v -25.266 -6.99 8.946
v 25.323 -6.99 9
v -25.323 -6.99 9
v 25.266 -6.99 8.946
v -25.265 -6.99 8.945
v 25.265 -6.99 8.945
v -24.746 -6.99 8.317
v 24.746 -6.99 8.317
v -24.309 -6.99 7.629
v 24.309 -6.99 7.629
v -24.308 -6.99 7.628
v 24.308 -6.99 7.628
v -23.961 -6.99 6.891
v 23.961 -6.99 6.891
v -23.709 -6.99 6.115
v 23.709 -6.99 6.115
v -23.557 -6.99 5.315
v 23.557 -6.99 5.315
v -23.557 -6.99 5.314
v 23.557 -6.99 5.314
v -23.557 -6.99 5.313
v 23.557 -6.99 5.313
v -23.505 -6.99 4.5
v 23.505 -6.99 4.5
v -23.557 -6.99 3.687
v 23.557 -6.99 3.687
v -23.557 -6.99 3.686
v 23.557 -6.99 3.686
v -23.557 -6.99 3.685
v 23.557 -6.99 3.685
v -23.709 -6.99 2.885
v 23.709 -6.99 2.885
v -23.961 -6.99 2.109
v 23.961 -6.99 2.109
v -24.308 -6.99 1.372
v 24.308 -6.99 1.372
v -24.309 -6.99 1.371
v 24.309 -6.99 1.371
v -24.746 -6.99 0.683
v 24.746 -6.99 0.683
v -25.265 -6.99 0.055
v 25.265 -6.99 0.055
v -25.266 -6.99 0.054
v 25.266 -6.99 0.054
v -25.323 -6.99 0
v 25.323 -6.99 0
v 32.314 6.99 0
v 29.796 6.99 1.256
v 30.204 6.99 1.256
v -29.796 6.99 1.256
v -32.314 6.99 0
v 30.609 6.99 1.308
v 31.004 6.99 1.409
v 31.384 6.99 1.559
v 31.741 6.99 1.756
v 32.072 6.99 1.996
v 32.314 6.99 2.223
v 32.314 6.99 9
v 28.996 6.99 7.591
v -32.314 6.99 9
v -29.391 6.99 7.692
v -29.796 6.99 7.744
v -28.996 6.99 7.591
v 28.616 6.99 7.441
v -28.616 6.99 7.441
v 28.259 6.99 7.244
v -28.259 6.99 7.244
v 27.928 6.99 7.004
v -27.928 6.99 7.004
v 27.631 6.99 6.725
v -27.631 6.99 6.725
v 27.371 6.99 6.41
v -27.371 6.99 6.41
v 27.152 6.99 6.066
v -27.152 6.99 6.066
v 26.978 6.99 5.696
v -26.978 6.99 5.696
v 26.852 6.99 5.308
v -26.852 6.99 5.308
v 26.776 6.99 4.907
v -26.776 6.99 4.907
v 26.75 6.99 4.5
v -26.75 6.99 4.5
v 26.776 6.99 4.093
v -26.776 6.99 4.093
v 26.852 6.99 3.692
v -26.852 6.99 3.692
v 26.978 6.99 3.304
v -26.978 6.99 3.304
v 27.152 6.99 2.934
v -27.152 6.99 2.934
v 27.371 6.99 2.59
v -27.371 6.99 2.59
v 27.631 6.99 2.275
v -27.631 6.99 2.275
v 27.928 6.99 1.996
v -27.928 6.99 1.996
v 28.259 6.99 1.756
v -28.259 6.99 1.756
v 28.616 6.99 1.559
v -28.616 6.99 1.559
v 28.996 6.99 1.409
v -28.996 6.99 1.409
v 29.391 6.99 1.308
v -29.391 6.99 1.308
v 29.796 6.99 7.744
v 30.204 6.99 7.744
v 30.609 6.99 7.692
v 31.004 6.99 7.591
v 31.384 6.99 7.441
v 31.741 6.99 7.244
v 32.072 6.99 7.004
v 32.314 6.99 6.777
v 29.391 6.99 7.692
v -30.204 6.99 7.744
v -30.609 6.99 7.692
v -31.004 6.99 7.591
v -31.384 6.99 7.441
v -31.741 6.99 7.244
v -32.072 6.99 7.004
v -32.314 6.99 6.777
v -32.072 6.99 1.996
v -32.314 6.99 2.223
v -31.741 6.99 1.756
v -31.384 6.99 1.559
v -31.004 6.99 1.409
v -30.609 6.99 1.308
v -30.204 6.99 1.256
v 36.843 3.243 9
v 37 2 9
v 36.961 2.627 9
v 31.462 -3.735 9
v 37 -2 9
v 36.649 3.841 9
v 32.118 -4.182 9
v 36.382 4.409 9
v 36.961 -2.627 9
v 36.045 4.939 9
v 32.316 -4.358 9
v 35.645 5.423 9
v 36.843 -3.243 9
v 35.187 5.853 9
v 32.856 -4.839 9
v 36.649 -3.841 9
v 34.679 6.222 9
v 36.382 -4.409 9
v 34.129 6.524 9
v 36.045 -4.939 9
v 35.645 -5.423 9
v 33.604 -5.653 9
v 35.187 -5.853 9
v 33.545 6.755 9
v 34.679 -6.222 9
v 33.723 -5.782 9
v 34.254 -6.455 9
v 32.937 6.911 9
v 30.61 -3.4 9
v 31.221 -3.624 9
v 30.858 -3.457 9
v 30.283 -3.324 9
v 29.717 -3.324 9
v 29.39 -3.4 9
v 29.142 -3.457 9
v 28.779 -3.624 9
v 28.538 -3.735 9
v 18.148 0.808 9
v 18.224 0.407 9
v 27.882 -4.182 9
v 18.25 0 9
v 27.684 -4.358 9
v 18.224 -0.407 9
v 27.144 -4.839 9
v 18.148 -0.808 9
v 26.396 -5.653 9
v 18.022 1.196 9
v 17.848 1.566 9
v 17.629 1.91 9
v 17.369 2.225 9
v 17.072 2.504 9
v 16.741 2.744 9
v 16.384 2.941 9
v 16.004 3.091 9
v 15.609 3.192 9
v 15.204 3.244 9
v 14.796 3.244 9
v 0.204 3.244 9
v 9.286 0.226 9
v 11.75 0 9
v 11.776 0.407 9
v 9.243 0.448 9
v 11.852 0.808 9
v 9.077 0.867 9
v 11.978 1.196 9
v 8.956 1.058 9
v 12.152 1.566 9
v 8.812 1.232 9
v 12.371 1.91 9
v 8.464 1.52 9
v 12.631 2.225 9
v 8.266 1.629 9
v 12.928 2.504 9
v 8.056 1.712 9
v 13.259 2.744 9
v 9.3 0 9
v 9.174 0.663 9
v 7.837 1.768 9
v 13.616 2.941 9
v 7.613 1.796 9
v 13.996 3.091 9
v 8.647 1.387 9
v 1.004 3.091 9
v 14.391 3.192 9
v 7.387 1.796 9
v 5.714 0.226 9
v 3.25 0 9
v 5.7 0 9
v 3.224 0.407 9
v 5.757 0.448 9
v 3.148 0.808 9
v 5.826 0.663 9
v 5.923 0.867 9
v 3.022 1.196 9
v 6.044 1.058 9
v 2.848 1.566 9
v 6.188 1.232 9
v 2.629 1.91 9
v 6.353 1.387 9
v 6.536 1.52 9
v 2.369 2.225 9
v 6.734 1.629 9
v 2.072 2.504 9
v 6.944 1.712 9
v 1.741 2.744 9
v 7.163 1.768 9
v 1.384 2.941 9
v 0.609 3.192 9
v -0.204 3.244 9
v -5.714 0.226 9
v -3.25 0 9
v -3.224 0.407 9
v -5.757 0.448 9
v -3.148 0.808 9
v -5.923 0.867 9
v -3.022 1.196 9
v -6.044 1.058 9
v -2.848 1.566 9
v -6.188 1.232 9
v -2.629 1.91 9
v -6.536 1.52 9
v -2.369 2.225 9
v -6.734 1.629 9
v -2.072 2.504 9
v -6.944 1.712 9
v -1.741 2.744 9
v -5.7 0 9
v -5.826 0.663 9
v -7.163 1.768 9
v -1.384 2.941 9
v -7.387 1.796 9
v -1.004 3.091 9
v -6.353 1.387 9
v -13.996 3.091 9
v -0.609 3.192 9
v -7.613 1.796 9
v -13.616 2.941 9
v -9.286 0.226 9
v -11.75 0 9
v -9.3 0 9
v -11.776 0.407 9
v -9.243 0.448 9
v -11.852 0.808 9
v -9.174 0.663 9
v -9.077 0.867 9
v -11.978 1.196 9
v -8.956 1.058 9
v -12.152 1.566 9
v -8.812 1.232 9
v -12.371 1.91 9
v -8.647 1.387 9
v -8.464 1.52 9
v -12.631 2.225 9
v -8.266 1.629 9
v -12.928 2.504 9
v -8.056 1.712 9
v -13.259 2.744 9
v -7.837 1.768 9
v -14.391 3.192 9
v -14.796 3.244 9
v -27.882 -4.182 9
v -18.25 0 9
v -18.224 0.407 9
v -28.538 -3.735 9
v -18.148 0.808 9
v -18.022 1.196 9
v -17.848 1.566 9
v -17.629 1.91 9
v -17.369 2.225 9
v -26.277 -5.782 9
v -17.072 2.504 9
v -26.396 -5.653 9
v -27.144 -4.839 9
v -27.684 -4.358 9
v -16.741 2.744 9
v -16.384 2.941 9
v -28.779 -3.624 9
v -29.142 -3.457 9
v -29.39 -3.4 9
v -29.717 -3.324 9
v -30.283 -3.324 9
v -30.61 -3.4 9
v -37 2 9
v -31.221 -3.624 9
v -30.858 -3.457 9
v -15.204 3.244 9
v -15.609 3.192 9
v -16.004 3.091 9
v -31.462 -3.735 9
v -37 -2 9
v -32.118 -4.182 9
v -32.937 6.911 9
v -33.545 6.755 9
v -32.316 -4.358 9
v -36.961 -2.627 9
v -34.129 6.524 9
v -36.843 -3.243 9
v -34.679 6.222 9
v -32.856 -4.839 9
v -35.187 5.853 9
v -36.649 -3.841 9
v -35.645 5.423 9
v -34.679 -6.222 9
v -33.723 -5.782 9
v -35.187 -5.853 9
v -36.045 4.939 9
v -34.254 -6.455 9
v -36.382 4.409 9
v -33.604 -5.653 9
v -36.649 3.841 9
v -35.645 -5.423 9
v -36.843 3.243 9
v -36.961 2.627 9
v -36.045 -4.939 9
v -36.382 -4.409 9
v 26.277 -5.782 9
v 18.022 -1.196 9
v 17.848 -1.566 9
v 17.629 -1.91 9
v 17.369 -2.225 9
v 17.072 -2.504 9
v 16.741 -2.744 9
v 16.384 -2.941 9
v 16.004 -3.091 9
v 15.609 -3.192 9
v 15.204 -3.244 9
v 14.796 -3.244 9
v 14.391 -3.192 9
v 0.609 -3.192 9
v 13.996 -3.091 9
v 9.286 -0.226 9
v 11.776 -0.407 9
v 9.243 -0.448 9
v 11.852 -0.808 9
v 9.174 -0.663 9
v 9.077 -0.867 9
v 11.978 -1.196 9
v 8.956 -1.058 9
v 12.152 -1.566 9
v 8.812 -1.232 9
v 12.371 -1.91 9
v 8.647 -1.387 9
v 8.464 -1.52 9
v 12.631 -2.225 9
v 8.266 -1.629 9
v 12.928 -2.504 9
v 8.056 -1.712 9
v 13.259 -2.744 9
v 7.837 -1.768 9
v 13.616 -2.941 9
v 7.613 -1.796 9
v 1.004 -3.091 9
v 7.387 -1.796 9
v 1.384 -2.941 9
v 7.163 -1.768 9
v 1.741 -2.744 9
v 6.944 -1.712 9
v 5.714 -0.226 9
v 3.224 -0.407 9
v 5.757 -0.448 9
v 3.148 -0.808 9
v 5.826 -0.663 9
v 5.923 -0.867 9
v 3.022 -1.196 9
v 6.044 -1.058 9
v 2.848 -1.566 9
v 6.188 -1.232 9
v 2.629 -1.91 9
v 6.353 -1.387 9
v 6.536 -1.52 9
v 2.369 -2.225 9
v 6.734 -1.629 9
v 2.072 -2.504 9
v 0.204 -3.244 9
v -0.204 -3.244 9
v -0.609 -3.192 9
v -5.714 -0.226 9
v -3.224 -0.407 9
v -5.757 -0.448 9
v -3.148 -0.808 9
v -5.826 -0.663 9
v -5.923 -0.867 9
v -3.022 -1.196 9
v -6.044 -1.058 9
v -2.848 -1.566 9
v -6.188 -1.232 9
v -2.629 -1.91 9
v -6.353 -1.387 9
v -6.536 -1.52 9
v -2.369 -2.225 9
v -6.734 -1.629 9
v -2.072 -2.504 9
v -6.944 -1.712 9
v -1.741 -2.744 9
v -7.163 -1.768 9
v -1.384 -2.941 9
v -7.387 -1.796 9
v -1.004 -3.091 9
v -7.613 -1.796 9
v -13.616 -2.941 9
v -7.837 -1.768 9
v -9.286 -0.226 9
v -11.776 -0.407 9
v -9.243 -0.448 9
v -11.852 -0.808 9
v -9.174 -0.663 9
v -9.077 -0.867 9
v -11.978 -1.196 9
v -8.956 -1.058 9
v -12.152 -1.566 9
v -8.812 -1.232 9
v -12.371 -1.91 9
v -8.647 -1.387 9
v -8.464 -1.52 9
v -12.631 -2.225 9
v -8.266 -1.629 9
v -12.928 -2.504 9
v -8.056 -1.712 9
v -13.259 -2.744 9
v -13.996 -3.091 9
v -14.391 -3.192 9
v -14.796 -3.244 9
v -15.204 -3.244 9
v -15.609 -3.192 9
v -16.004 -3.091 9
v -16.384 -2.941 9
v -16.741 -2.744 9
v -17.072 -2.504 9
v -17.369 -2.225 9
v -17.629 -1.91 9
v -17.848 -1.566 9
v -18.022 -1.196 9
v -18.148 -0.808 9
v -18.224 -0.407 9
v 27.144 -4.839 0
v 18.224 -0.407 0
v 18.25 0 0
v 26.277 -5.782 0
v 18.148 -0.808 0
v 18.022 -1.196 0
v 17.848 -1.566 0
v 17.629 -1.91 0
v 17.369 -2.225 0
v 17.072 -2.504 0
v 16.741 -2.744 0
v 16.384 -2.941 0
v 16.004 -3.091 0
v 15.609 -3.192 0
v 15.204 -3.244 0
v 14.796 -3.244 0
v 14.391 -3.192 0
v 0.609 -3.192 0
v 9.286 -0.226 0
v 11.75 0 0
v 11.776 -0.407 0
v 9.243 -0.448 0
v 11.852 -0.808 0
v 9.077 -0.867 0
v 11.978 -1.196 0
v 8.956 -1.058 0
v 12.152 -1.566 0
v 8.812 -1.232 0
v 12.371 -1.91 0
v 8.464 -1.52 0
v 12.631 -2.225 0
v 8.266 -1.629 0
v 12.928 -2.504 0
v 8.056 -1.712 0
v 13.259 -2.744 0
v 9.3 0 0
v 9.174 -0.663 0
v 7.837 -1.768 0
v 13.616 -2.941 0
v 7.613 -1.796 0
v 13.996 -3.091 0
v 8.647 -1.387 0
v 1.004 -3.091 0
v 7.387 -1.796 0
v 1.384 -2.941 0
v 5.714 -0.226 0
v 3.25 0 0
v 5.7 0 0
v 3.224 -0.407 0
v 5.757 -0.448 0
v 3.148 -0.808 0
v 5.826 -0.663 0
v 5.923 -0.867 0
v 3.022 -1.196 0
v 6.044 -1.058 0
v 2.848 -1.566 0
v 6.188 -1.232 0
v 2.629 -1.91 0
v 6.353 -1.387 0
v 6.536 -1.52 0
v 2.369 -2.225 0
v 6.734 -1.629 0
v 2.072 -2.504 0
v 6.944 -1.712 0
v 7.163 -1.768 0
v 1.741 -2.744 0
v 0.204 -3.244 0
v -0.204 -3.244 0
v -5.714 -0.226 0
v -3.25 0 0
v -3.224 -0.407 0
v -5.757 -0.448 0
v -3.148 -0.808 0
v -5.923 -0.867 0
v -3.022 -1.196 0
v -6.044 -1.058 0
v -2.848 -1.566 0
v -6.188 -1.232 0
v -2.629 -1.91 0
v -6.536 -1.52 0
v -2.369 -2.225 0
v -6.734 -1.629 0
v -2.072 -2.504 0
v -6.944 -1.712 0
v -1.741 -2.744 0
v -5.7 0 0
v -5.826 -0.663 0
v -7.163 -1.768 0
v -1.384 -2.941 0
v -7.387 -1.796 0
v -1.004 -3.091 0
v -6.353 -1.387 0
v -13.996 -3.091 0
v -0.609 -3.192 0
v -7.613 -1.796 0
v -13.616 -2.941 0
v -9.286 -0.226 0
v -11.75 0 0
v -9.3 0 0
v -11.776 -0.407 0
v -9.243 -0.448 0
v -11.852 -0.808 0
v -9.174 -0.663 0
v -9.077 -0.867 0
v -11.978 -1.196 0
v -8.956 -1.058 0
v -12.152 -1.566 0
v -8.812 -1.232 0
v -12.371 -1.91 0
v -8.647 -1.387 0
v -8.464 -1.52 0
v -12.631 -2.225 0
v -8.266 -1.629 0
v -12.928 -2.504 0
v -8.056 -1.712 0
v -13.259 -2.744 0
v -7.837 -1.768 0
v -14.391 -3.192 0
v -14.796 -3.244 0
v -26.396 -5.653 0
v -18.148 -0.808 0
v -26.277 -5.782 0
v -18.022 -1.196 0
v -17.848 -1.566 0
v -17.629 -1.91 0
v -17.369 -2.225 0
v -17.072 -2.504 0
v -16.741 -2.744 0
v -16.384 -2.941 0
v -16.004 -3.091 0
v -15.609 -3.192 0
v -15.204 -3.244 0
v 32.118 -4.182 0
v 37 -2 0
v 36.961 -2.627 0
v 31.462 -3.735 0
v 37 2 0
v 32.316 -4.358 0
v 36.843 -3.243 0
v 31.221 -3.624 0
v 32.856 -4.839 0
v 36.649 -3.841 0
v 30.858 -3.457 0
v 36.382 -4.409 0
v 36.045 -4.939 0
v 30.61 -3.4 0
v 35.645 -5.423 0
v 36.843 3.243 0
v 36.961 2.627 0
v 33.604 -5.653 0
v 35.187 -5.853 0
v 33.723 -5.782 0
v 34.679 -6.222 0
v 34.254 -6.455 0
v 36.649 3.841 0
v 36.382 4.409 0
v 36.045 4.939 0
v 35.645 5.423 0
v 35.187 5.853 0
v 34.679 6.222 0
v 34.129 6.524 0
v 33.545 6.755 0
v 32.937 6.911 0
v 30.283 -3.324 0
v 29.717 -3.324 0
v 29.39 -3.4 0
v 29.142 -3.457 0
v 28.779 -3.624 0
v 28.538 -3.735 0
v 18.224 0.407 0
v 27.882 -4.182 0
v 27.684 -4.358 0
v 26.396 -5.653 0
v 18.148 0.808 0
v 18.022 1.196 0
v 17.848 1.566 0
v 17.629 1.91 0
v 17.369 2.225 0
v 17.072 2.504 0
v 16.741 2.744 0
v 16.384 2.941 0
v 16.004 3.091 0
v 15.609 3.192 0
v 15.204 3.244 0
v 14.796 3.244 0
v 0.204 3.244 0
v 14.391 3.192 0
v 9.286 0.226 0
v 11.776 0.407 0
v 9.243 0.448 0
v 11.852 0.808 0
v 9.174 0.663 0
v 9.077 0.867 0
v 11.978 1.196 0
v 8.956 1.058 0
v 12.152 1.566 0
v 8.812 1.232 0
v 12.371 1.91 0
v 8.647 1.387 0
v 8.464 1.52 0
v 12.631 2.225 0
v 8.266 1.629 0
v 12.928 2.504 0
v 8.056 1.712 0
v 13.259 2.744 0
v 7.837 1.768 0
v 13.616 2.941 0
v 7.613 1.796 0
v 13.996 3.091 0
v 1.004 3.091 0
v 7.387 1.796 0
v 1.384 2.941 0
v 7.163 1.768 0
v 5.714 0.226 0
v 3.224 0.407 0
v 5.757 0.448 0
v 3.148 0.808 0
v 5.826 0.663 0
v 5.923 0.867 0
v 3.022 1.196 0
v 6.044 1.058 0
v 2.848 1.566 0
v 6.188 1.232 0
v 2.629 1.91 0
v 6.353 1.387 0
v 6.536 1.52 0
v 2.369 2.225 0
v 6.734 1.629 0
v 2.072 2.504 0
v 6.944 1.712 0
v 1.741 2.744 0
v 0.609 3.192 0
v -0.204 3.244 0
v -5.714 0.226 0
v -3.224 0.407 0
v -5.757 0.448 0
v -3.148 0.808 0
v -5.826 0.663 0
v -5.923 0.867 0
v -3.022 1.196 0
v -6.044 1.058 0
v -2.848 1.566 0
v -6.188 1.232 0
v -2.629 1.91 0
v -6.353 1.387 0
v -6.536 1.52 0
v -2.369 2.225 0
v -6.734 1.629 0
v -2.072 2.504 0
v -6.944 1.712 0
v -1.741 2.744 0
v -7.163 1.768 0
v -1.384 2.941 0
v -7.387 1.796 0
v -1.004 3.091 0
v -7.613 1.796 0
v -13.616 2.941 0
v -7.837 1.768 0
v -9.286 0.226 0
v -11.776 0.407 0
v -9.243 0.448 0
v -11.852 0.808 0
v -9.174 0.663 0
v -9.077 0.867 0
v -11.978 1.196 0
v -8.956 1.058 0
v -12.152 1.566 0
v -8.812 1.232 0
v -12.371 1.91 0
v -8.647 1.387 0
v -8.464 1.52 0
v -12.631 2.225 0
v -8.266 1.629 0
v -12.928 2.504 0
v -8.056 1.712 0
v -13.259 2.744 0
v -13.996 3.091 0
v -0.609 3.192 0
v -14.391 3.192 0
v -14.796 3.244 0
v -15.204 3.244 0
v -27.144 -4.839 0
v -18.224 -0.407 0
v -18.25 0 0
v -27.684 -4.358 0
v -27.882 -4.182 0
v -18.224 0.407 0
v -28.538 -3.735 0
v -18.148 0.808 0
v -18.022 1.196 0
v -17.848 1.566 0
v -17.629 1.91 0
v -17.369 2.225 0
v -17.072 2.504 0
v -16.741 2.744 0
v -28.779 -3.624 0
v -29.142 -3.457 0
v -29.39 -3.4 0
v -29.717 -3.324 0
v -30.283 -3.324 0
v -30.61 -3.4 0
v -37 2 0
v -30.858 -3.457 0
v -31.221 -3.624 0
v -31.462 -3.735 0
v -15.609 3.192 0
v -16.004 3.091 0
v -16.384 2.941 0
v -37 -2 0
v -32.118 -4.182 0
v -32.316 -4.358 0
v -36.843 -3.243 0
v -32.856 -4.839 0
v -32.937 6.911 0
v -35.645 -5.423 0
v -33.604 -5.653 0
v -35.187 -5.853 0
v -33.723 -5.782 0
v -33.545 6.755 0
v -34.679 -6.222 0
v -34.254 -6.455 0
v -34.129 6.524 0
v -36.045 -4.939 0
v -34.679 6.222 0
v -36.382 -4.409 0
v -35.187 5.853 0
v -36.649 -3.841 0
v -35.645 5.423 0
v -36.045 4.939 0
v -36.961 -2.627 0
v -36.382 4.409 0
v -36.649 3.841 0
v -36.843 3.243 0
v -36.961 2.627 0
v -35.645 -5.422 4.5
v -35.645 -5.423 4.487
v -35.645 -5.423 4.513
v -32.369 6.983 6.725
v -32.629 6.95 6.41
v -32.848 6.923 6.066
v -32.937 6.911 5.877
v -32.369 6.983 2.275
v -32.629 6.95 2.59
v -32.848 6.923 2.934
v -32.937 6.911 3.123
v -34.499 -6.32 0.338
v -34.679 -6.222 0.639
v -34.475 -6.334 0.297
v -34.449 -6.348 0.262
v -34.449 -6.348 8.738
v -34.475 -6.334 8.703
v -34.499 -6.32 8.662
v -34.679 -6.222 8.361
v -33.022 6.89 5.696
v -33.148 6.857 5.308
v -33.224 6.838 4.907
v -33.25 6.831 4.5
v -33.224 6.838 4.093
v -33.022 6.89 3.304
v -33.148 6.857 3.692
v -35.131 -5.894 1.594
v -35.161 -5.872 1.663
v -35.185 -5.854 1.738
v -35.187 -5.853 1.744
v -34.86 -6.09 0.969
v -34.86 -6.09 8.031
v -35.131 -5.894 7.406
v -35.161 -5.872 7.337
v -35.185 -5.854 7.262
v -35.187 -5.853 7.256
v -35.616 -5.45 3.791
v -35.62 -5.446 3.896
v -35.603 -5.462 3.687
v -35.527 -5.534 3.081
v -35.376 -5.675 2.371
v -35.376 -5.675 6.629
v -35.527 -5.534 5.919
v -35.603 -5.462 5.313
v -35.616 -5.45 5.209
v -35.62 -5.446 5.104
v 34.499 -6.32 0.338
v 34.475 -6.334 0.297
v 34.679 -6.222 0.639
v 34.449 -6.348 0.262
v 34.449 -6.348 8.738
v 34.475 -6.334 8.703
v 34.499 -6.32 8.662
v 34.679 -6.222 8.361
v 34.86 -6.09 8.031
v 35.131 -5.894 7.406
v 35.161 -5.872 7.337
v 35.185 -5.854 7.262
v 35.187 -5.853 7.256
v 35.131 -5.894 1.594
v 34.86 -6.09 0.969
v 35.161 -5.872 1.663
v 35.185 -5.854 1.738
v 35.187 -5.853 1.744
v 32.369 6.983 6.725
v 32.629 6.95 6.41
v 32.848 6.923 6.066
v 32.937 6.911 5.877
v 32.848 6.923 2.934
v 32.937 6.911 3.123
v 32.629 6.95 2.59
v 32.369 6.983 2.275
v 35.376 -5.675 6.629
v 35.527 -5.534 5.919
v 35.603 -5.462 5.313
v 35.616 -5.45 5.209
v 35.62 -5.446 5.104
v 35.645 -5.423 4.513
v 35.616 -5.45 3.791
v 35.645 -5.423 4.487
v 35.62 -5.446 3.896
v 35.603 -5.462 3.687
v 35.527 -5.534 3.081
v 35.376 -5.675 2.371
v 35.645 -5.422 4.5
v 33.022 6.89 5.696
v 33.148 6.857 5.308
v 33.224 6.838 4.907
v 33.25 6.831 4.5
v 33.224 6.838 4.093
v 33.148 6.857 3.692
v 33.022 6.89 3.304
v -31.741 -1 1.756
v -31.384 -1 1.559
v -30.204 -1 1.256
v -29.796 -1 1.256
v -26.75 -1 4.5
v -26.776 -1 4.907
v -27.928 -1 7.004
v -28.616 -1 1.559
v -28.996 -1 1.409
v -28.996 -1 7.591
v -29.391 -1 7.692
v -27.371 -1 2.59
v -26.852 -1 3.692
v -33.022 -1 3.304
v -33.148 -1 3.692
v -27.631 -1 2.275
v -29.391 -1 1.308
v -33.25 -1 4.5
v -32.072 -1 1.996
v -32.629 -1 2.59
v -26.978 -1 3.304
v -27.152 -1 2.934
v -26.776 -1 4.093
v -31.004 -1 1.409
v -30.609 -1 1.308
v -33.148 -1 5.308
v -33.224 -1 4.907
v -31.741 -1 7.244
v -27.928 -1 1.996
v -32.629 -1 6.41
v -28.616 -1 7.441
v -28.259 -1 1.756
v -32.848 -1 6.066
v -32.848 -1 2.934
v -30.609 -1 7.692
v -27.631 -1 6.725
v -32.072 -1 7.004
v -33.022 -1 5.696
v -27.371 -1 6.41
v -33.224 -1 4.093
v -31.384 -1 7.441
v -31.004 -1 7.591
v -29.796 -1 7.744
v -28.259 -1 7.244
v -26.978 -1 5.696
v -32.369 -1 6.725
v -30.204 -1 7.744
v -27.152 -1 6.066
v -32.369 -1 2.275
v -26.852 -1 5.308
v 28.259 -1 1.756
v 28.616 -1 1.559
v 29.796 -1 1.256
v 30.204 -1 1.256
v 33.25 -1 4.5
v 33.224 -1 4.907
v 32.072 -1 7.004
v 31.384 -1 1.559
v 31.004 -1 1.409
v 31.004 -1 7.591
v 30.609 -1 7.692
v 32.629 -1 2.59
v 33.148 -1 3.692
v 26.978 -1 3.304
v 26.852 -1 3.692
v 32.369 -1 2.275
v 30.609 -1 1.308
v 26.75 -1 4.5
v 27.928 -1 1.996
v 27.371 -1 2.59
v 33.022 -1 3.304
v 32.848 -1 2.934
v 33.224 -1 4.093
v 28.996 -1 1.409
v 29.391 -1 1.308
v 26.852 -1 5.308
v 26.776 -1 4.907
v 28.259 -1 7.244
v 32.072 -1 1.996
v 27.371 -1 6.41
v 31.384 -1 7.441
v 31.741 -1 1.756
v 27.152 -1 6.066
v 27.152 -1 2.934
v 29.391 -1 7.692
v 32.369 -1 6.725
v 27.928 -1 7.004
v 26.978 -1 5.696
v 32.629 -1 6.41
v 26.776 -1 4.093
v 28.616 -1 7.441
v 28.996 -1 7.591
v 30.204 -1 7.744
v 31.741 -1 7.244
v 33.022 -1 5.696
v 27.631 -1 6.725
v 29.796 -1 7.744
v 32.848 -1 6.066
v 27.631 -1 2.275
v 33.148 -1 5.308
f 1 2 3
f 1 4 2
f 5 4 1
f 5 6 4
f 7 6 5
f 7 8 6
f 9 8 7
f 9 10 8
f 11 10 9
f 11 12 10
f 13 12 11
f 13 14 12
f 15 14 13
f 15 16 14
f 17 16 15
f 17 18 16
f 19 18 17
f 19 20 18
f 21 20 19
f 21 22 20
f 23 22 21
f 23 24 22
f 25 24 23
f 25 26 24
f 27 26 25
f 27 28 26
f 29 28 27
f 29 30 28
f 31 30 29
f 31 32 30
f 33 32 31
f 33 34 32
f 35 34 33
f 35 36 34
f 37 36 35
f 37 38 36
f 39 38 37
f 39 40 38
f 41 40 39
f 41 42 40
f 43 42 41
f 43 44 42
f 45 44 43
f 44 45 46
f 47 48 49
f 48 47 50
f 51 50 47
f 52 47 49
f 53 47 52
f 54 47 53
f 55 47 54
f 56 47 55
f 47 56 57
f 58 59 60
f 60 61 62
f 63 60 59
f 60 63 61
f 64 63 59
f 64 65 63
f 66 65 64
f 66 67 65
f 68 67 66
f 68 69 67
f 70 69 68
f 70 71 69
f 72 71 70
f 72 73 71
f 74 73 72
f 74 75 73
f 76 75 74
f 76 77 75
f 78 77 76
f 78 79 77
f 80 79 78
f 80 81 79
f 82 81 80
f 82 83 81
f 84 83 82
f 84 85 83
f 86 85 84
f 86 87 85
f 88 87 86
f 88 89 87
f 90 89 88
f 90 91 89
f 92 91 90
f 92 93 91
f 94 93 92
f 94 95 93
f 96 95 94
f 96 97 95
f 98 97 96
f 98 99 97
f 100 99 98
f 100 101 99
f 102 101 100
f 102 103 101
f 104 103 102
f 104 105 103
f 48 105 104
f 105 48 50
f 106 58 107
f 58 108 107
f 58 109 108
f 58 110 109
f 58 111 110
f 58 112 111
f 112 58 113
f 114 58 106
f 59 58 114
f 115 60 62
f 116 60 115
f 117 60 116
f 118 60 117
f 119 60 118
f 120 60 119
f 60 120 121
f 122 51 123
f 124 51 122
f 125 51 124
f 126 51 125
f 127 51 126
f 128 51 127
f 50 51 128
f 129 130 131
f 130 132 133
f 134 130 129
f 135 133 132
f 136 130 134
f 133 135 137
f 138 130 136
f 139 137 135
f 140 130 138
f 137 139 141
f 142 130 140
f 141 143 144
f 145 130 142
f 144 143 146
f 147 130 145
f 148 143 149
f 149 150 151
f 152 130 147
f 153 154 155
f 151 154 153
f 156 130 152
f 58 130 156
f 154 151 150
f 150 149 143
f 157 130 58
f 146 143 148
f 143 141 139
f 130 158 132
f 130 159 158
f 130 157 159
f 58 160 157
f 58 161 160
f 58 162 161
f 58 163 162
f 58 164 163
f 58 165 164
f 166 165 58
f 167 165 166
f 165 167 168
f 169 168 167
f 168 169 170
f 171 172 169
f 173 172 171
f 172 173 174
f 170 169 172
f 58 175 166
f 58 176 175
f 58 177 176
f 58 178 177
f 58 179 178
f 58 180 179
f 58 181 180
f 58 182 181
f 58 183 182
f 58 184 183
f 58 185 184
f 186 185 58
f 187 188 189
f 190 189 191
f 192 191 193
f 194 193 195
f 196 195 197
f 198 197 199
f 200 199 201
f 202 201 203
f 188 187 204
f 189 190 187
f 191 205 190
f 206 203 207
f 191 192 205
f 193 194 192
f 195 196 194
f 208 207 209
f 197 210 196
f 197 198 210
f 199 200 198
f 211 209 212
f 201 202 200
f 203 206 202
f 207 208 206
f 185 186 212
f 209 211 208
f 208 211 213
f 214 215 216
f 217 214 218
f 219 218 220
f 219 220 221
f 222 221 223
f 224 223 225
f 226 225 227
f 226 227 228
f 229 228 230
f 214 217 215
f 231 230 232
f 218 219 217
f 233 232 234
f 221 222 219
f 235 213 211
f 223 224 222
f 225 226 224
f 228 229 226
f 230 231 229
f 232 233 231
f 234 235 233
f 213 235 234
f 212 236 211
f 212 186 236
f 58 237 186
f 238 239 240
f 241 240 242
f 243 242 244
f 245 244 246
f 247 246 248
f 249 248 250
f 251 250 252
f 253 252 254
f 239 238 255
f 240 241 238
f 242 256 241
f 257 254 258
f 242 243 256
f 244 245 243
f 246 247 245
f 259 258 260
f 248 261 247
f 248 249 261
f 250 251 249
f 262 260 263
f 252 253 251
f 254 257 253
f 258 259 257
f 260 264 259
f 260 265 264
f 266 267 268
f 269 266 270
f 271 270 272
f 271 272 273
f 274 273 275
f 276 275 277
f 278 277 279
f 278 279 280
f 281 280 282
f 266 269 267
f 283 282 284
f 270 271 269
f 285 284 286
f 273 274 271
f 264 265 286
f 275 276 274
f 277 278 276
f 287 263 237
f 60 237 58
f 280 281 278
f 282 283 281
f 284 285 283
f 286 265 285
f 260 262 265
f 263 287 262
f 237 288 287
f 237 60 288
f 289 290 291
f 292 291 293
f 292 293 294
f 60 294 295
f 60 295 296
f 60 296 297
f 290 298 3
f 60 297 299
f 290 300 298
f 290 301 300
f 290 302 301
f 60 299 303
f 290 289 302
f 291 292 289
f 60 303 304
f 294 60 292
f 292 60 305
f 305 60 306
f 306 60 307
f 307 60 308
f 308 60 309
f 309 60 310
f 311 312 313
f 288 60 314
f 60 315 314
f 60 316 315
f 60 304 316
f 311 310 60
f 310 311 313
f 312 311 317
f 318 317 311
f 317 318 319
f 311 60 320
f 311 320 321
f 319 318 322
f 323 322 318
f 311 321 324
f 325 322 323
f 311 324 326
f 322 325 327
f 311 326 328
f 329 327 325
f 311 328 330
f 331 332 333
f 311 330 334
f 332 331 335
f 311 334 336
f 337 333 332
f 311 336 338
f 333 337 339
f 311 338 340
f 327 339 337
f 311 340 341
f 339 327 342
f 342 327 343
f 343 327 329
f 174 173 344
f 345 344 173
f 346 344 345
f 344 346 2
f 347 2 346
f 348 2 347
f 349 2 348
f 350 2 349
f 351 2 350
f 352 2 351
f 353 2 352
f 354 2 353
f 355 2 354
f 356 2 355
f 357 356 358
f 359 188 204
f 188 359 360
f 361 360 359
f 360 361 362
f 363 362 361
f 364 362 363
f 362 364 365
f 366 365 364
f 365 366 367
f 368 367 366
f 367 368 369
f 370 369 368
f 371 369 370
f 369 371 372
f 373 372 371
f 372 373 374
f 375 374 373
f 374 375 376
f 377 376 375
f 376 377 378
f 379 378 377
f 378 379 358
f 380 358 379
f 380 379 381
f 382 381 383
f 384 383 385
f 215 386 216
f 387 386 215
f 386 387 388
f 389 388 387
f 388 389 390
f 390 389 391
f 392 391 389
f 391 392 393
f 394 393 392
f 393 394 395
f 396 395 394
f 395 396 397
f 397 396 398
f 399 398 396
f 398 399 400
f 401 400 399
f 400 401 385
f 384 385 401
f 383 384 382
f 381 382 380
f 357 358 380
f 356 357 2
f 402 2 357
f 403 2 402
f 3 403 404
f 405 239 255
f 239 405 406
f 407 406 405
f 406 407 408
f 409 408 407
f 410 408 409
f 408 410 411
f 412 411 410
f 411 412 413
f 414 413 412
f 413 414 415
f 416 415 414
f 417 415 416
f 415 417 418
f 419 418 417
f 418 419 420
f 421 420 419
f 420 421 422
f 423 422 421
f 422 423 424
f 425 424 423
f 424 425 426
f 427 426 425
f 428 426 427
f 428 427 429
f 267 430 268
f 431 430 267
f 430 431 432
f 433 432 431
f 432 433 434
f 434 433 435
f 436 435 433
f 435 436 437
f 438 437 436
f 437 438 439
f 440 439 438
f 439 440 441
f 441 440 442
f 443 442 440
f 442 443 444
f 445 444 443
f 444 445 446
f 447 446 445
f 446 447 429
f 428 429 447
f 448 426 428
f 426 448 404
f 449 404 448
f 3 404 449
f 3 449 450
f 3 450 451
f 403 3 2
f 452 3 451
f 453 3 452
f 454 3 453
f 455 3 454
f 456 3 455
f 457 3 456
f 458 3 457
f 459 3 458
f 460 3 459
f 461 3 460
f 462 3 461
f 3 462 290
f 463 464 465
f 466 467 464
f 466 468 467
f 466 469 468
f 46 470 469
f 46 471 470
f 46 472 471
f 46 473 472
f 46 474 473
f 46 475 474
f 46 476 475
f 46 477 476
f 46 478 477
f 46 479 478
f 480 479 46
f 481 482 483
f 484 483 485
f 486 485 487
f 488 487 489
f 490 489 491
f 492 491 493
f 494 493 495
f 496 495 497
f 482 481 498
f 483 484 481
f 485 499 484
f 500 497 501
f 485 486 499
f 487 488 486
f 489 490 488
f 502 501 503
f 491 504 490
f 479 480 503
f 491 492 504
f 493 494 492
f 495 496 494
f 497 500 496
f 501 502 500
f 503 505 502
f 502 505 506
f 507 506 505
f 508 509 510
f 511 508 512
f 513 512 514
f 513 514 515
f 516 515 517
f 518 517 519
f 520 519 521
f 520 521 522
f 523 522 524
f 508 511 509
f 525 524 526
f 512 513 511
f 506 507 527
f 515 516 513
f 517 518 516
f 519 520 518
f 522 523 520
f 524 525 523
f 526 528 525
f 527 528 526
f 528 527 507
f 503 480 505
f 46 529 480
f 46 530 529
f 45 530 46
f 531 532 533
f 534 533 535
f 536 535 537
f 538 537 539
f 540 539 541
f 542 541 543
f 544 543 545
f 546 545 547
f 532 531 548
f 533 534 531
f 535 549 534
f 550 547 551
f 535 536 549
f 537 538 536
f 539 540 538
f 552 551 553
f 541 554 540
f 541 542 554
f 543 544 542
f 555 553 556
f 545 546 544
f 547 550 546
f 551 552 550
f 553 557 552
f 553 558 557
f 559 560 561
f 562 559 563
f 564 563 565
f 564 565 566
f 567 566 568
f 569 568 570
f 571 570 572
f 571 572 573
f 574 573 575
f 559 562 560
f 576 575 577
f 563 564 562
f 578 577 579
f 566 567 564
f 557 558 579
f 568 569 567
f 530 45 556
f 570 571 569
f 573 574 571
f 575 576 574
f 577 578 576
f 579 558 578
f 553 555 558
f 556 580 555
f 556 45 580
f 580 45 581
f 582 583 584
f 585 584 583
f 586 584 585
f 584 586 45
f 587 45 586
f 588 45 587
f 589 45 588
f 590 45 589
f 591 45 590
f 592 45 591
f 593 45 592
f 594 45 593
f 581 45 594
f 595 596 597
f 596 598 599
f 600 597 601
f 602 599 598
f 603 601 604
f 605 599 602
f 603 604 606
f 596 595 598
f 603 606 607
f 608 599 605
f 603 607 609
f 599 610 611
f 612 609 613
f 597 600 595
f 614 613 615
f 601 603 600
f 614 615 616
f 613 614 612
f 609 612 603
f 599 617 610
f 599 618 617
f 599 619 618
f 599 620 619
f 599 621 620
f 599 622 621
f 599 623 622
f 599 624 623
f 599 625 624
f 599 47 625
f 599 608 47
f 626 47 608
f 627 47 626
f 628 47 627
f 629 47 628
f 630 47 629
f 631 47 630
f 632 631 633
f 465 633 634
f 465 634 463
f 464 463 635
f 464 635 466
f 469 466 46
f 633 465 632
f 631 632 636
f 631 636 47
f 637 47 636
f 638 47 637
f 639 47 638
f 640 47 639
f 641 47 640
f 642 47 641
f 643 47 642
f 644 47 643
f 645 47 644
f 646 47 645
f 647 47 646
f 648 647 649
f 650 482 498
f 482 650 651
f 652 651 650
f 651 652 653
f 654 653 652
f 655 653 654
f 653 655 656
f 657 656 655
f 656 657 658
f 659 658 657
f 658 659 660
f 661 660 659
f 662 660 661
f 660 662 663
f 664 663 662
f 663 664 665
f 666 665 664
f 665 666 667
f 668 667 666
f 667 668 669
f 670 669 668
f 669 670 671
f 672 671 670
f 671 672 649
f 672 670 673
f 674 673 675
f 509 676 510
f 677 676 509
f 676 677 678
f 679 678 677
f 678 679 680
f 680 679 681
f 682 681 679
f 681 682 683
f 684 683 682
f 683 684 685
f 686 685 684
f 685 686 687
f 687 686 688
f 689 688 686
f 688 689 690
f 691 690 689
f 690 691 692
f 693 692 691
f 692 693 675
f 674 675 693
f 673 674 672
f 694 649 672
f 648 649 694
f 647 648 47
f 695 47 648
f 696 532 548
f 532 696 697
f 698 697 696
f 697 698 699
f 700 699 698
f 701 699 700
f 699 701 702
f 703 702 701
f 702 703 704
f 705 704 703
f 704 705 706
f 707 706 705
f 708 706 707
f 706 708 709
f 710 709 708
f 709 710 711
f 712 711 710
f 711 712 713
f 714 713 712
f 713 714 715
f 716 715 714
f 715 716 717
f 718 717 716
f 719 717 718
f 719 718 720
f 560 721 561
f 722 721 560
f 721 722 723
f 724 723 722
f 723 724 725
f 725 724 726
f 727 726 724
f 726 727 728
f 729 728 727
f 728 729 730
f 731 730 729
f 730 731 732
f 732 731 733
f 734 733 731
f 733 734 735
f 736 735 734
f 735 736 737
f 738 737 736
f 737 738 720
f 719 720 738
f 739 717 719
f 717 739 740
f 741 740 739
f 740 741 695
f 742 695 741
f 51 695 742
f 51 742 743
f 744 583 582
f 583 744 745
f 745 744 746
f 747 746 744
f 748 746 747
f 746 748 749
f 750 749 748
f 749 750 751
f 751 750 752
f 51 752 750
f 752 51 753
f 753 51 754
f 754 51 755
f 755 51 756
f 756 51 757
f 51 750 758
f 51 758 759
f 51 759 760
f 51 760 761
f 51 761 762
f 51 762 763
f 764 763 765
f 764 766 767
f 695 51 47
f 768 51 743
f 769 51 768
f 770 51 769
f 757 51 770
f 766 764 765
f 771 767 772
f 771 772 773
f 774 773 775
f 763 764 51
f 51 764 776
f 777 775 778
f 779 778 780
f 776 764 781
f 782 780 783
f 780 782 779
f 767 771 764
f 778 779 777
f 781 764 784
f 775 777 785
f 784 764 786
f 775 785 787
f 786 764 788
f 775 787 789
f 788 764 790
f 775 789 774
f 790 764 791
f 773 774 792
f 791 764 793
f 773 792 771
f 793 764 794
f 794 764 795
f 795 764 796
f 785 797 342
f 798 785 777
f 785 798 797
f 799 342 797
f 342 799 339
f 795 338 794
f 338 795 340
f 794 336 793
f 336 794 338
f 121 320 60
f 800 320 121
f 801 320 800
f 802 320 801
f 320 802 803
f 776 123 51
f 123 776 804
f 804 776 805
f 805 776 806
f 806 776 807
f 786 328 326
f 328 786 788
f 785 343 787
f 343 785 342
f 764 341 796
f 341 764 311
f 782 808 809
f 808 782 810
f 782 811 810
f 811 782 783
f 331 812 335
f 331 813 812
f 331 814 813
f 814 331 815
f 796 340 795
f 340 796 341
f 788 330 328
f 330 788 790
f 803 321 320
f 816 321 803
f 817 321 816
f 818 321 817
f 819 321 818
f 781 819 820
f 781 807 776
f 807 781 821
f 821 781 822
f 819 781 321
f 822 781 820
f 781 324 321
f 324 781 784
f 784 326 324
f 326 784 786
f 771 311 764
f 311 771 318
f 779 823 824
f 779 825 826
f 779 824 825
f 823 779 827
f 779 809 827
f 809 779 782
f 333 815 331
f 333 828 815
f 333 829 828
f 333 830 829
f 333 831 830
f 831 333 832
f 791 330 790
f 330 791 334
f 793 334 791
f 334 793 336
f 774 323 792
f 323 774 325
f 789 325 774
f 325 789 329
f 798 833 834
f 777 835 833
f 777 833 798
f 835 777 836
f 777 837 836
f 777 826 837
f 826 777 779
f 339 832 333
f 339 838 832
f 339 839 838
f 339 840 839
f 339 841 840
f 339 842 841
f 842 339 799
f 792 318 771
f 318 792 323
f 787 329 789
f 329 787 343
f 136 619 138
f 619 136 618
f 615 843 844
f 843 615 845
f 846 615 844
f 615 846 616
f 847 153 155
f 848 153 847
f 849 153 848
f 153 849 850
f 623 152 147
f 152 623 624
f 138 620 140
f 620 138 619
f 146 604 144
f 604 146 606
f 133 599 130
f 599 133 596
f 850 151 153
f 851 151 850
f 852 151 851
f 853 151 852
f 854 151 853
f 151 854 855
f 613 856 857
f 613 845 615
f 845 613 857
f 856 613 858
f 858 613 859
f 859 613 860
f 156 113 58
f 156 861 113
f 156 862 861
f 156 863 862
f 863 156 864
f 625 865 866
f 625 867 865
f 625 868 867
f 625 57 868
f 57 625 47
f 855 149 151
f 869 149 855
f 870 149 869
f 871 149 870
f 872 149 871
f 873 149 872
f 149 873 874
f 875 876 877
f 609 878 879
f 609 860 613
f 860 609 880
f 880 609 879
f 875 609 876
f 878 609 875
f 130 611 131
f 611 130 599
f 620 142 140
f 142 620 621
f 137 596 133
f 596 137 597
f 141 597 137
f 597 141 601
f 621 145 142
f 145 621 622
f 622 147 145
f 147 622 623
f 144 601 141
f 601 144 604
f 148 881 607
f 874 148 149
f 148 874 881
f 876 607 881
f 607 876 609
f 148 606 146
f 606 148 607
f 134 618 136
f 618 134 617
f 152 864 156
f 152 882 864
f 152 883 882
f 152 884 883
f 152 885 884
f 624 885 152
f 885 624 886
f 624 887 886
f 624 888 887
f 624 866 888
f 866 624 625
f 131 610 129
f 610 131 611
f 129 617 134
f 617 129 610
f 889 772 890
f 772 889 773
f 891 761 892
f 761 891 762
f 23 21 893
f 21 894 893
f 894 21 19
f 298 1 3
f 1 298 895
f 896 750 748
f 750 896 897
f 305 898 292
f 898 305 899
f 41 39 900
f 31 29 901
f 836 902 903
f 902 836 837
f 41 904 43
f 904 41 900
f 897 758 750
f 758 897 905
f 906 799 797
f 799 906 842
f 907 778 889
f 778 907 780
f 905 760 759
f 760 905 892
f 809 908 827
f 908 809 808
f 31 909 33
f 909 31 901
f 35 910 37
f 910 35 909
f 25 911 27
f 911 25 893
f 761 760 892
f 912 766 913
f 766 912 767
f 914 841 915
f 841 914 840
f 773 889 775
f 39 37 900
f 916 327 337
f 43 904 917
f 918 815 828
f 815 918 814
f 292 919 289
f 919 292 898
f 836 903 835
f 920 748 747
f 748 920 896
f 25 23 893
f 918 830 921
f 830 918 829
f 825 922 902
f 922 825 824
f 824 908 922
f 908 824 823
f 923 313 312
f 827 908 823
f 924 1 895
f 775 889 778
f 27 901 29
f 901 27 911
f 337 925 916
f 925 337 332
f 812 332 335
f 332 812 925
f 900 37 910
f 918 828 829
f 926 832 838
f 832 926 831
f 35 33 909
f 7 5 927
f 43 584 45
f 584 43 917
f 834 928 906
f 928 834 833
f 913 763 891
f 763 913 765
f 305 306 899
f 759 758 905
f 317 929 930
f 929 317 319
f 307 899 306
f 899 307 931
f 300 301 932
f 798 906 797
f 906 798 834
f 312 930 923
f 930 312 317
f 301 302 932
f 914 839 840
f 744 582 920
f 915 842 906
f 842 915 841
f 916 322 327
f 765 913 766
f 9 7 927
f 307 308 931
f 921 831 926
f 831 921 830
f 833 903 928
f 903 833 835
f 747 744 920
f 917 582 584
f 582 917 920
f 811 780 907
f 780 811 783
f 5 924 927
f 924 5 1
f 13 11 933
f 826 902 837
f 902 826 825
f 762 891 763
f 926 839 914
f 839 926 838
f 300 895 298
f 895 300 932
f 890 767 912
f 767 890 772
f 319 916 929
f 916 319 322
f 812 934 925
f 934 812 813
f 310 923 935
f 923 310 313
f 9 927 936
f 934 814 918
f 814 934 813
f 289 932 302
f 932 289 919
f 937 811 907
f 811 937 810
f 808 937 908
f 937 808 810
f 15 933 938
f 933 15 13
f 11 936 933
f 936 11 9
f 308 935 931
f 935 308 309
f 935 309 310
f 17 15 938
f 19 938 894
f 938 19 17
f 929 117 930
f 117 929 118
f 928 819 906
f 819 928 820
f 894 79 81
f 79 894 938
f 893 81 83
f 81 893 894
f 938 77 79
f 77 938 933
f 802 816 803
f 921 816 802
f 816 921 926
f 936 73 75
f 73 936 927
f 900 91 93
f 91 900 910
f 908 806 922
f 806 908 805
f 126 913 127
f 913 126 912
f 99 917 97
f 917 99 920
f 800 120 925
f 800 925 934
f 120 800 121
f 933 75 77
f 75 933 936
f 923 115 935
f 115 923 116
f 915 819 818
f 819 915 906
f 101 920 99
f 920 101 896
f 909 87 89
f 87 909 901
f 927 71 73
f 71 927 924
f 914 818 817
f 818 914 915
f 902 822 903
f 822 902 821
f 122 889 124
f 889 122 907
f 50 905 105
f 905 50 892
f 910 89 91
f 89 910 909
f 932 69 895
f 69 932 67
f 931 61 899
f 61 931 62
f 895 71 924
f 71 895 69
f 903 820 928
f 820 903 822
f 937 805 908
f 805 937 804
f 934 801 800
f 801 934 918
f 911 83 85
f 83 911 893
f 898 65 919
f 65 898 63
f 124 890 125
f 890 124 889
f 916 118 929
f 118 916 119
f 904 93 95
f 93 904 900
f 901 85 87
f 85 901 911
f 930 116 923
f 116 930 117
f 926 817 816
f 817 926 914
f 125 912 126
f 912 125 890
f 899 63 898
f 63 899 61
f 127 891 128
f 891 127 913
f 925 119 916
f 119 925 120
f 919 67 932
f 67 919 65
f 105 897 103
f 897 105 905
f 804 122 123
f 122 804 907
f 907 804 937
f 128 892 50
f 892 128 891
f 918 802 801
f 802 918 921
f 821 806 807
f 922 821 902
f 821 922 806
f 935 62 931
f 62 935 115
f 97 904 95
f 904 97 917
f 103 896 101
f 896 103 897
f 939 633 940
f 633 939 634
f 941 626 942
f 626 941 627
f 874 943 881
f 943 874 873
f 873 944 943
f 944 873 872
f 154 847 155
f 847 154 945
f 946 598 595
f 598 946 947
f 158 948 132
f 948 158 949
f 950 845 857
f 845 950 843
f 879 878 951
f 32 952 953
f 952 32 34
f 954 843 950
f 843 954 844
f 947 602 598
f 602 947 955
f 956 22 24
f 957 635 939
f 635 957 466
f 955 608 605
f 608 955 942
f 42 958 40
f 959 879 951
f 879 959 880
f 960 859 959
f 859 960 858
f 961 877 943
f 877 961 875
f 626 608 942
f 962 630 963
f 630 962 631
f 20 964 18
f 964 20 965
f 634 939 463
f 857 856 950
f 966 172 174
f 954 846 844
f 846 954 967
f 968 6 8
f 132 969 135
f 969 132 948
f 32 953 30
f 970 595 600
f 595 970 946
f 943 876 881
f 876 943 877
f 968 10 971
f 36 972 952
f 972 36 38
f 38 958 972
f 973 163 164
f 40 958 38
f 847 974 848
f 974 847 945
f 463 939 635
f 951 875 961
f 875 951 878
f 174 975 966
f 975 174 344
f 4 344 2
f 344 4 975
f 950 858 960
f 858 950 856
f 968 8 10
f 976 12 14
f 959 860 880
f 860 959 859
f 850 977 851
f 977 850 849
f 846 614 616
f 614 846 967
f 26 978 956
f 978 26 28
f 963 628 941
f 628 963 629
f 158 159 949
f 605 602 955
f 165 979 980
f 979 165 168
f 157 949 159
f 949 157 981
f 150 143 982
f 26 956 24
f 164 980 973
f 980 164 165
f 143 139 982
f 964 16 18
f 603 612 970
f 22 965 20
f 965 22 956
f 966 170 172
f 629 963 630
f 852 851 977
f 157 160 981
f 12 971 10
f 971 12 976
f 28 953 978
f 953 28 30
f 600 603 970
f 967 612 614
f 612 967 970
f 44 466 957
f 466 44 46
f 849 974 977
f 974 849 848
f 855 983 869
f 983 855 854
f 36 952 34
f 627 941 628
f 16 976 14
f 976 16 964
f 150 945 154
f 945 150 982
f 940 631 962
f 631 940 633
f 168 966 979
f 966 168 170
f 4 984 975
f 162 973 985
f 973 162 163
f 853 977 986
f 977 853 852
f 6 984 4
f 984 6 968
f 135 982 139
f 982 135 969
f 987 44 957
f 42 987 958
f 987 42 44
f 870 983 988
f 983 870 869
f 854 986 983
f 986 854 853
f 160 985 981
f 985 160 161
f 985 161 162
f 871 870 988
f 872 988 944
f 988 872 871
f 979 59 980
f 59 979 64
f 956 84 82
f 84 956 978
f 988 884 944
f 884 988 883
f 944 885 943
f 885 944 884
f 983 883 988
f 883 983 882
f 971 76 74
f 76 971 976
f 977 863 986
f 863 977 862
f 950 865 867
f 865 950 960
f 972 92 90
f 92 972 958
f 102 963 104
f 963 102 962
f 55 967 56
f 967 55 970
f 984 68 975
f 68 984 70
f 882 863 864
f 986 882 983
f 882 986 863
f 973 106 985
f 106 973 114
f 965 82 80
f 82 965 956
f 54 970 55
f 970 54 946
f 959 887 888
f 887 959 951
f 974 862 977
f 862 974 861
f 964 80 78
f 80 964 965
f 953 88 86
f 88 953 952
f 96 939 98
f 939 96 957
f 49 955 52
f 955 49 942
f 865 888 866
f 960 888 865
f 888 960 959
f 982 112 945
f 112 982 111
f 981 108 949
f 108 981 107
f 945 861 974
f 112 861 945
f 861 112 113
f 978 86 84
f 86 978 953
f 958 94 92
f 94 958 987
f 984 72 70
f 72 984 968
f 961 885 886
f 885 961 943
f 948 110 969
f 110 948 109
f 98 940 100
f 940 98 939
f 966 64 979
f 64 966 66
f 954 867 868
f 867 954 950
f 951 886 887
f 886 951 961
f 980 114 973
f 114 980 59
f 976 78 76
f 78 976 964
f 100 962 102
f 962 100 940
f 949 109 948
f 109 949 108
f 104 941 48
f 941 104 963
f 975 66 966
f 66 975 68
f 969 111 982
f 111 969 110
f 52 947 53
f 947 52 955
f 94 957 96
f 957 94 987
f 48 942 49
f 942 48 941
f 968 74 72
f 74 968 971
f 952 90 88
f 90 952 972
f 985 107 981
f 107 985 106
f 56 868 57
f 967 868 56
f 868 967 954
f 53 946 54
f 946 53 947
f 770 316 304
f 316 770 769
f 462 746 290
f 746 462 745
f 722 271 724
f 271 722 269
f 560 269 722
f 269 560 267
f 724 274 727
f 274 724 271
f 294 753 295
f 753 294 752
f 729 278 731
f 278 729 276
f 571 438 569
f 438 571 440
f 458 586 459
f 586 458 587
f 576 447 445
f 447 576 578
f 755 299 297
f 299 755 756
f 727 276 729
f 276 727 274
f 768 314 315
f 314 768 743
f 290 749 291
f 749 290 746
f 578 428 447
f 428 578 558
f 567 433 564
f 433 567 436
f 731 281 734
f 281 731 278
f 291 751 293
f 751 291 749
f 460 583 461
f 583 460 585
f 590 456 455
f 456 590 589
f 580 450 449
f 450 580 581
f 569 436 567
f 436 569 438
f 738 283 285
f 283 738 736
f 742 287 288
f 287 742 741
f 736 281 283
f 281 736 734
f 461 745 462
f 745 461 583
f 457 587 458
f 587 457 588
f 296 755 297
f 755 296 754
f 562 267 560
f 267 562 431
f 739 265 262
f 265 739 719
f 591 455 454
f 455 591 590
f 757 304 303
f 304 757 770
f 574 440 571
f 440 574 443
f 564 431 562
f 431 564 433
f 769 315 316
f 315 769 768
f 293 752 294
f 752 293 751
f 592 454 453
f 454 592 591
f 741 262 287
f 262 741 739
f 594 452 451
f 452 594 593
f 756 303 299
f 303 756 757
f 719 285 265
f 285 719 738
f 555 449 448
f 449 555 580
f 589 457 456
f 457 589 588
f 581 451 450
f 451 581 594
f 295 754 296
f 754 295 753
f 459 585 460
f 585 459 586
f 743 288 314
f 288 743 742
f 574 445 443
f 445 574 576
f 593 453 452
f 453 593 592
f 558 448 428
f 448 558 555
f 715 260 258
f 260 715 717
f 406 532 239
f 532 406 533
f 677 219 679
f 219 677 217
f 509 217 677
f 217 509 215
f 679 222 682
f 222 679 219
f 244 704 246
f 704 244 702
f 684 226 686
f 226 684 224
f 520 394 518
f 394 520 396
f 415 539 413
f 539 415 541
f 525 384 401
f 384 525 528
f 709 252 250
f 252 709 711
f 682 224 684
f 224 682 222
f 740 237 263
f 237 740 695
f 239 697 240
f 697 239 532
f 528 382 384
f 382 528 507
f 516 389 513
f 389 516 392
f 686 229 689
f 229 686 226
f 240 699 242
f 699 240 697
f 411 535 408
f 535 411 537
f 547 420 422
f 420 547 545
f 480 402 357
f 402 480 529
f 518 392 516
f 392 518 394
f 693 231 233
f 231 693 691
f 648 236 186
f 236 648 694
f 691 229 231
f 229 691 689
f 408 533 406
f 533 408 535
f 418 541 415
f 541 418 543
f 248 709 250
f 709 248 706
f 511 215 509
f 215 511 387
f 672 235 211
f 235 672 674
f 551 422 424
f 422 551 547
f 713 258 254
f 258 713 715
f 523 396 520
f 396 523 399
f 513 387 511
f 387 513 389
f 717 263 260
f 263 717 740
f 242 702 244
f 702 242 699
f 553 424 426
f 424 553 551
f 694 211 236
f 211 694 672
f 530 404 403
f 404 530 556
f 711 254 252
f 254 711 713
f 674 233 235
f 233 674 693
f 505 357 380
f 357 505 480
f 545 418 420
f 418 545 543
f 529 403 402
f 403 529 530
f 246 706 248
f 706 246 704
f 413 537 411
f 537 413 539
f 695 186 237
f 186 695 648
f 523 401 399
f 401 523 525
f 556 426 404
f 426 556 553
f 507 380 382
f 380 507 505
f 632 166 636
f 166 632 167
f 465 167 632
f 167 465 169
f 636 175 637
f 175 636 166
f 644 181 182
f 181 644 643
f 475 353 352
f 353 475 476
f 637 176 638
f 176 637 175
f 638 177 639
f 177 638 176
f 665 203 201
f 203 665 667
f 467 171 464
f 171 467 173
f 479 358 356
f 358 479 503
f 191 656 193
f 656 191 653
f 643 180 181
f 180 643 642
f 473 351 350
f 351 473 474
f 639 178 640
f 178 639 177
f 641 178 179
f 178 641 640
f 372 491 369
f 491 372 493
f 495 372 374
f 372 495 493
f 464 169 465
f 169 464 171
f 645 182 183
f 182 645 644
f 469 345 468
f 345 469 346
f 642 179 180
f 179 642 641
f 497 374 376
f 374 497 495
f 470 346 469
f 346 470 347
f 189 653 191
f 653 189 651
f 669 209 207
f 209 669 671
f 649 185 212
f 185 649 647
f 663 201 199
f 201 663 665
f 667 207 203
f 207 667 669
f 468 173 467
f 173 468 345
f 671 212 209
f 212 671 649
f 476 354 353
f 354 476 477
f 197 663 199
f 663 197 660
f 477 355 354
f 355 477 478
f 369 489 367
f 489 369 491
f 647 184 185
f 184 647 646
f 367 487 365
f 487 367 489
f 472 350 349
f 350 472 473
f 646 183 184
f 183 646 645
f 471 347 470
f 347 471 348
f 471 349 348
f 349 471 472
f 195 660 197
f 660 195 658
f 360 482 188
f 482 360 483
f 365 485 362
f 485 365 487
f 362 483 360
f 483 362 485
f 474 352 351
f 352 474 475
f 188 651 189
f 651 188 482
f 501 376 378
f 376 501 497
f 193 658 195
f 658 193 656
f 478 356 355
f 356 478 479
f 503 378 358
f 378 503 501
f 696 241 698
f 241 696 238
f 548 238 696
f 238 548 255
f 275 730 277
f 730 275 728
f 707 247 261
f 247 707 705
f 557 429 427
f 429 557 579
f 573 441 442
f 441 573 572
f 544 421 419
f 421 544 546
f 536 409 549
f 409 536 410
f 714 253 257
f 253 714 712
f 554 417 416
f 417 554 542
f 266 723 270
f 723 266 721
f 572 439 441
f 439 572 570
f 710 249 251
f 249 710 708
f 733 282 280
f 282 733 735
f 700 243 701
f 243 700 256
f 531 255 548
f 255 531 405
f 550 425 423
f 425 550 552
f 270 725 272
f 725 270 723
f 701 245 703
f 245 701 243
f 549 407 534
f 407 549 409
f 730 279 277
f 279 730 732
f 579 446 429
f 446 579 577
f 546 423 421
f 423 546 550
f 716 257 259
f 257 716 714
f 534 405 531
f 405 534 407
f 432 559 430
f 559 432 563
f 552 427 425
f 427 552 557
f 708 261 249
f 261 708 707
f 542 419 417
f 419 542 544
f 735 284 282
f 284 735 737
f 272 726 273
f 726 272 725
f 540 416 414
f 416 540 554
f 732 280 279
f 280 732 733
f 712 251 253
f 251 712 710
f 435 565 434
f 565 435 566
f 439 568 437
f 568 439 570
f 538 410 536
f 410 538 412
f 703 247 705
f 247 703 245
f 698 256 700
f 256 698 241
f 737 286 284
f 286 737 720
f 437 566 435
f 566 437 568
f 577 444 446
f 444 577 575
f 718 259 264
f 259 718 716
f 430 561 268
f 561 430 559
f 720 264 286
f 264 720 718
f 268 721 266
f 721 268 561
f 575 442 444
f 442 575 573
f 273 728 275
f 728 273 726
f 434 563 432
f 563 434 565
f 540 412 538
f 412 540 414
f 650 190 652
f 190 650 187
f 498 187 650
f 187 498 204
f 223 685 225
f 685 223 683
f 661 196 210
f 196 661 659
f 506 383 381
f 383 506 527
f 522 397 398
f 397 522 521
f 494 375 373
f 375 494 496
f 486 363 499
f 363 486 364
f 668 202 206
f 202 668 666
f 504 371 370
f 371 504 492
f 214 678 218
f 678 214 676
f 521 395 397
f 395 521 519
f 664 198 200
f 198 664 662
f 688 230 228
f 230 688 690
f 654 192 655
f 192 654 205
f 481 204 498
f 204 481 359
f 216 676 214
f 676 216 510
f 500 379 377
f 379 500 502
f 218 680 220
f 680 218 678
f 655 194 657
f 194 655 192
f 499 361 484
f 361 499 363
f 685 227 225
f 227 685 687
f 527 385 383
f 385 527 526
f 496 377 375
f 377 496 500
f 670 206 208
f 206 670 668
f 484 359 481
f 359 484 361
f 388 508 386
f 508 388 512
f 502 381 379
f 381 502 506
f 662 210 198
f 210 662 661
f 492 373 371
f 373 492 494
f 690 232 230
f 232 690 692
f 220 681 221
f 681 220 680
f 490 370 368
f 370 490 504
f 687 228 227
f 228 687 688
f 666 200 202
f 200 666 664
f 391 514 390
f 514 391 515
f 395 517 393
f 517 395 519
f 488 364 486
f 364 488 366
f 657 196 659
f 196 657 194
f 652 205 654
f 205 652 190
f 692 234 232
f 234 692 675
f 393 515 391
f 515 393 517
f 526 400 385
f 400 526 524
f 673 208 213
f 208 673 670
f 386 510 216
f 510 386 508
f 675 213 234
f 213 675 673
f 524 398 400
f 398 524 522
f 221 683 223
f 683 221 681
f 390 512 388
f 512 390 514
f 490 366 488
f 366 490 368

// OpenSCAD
$fn = 50;


difference() {
	union() {
		hull() {
			translate(v = [-17.0000000000, 2.0000000000, 0]) {
				cylinder(h = 9, r = 5);
			}
			translate(v = [17.0000000000, 2.0000000000, 0]) {
				cylinder(h = 9, r = 5);
			}
			translate(v = [-17.0000000000, -2.0000000000, 0]) {
				cylinder(h = 9, r = 5);
			}
			translate(v = [17.0000000000, -2.0000000000, 0]) {
				cylinder(h = 9, r = 5);
			}
		}
		translate(v = [-22.5000000000, 0.0000000000, 0]) {
			hull() {
				translate(v = [-9.5000000000, 2.0000000000, 0]) {
					cylinder(h = 9, r = 5);
				}
				translate(v = [9.5000000000, 2.0000000000, 0]) {
					cylinder(h = 9, r = 5);
				}
				translate(v = [-9.5000000000, -2.0000000000, 0]) {
					cylinder(h = 9, r = 5);
				}
				translate(v = [9.5000000000, -2.0000000000, 0]) {
					cylinder(h = 9, r = 5);
				}
			}
		}
		translate(v = [-22.5000000000, 0.0000000000, 0]) {
			hull() {
				translate(v = [-9.5000000000, 2.0000000000, 0]) {
					cylinder(h = 9, r = 5);
				}
				translate(v = [9.5000000000, 2.0000000000, 0]) {
					cylinder(h = 9, r = 5);
				}
				translate(v = [-9.5000000000, -2.0000000000, 0]) {
					cylinder(h = 9, r = 5);
				}
				translate(v = [9.5000000000, -2.0000000000, 0]) {
					cylinder(h = 9, r = 5);
				}
			}
		}
		translate(v = [22.5000000000, 0.0000000000, 0]) {
			hull() {
				translate(v = [-9.5000000000, 2.0000000000, 0]) {
					cylinder(h = 9, r = 5);
				}
				translate(v = [9.5000000000, 2.0000000000, 0]) {
					cylinder(h = 9, r = 5);
				}
				translate(v = [-9.5000000000, -2.0000000000, 0]) {
					cylinder(h = 9, r = 5);
				}
				translate(v = [9.5000000000, -2.0000000000, 0]) {
					cylinder(h = 9, r = 5);
				}
			}
		}
		translate(v = [22.5000000000, 0.0000000000, 0]) {
			hull() {
				translate(v = [-9.5000000000, 2.0000000000, 0]) {
					cylinder(h = 9, r = 5);
				}
				translate(v = [9.5000000000, 2.0000000000, 0]) {
					cylinder(h = 9, r = 5);
				}
				translate(v = [-9.5000000000, -2.0000000000, 0]) {
					cylinder(h = 9, r = 5);
				}
				translate(v = [9.5000000000, -2.0000000000, 0]) {
					cylinder(h = 9, r = 5);
				}
			}
		}
	}
	union() {
		translate(v = [-30.0000000000, -7.0000000000, 4.5000000000]) {
			rotate(a = [90, 0, 0]) {
				difference() {
					union() {
						#translate(v = [0, 0, -14.0000000000]) {
							cylinder(h = 14, r = 2.2500000000);
						}
						#translate(v = [0, 0, -6]) {
							cylinder(h = 6, r1 = 3.2500000000, r2 = 6.5000000000);
						}
						#translate(v = [0, 0, -14.0000000000]) {
							cylinder(h = 14, r = 3.2500000000);
						}
						#translate(v = [0, 0, -14.0000000000]) {
							cylinder(h = 14, r = 2.2500000000);
						}
					}
					union();
				}
			}
		}
		translate(v = [30.0000000000, -7.0000000000, 4.5000000000]) {
			rotate(a = [90, 0, 0]) {
				difference() {
					union() {
						#translate(v = [0, 0, -14.0000000000]) {
							cylinder(h = 14, r = 2.2500000000);
						}
						#translate(v = [0, 0, -6]) {
							cylinder(h = 6, r1 = 3.2500000000, r2 = 6.5000000000);
						}
						#translate(v = [0, 0, -14.0000000000]) {
							cylinder(h = 14, r = 3.2500000000);
						}
						#translate(v = [0, 0, -14.0000000000]) {
							cylinder(h = 14, r = 2.2500000000);
						}
					}
					union();
				}
			}
		}
		translate(v = [-15.0000000000, 0.0000000000, 0]) {
			translate(v = [0, 0, -100]) {
				cylinder(h = 200, r = 3.2500000000);
			}
		}
		translate(v = [0, 0, -100]) {
			cylinder(h = 200, r = 3.2500000000);
		}
		translate(v = [15.0000000000, 0.0000000000, 0]) {
			translate(v = [0, 0, -100]) {
				cylinder(h = 200, r = 3.2500000000);
			}
		}
		translate(v = [-15.0000000000, 0.0000000000, 0]) {
			translate(v = [0, 0, -100]) {
				cylinder(h = 200, r = 1.8000000000);
			}
		}
		translate(v = [-7.5000000000, 0.0000000000, 0]) {
			translate(v = [0, 0, -100]) {
				cylinder(h = 200, r = 1.8000000000);
			}
		}
		translate(v = [0, 0, -100]) {
			cylinder(h = 200, r = 1.8000000000);
		}
		translate(v = [7.5000000000, 0.0000000000, 0]) {
			translate(v = [0, 0, -100]) {
				cylinder(h = 200, r = 1.8000000000);
			}
		}
		translate(v = [15.0000000000, 0.0000000000, 0]) {
			translate(v = [0, 0, -100]) {
				cylinder(h = 200, r = 1.8000000000);
			}
		}
	}
}
